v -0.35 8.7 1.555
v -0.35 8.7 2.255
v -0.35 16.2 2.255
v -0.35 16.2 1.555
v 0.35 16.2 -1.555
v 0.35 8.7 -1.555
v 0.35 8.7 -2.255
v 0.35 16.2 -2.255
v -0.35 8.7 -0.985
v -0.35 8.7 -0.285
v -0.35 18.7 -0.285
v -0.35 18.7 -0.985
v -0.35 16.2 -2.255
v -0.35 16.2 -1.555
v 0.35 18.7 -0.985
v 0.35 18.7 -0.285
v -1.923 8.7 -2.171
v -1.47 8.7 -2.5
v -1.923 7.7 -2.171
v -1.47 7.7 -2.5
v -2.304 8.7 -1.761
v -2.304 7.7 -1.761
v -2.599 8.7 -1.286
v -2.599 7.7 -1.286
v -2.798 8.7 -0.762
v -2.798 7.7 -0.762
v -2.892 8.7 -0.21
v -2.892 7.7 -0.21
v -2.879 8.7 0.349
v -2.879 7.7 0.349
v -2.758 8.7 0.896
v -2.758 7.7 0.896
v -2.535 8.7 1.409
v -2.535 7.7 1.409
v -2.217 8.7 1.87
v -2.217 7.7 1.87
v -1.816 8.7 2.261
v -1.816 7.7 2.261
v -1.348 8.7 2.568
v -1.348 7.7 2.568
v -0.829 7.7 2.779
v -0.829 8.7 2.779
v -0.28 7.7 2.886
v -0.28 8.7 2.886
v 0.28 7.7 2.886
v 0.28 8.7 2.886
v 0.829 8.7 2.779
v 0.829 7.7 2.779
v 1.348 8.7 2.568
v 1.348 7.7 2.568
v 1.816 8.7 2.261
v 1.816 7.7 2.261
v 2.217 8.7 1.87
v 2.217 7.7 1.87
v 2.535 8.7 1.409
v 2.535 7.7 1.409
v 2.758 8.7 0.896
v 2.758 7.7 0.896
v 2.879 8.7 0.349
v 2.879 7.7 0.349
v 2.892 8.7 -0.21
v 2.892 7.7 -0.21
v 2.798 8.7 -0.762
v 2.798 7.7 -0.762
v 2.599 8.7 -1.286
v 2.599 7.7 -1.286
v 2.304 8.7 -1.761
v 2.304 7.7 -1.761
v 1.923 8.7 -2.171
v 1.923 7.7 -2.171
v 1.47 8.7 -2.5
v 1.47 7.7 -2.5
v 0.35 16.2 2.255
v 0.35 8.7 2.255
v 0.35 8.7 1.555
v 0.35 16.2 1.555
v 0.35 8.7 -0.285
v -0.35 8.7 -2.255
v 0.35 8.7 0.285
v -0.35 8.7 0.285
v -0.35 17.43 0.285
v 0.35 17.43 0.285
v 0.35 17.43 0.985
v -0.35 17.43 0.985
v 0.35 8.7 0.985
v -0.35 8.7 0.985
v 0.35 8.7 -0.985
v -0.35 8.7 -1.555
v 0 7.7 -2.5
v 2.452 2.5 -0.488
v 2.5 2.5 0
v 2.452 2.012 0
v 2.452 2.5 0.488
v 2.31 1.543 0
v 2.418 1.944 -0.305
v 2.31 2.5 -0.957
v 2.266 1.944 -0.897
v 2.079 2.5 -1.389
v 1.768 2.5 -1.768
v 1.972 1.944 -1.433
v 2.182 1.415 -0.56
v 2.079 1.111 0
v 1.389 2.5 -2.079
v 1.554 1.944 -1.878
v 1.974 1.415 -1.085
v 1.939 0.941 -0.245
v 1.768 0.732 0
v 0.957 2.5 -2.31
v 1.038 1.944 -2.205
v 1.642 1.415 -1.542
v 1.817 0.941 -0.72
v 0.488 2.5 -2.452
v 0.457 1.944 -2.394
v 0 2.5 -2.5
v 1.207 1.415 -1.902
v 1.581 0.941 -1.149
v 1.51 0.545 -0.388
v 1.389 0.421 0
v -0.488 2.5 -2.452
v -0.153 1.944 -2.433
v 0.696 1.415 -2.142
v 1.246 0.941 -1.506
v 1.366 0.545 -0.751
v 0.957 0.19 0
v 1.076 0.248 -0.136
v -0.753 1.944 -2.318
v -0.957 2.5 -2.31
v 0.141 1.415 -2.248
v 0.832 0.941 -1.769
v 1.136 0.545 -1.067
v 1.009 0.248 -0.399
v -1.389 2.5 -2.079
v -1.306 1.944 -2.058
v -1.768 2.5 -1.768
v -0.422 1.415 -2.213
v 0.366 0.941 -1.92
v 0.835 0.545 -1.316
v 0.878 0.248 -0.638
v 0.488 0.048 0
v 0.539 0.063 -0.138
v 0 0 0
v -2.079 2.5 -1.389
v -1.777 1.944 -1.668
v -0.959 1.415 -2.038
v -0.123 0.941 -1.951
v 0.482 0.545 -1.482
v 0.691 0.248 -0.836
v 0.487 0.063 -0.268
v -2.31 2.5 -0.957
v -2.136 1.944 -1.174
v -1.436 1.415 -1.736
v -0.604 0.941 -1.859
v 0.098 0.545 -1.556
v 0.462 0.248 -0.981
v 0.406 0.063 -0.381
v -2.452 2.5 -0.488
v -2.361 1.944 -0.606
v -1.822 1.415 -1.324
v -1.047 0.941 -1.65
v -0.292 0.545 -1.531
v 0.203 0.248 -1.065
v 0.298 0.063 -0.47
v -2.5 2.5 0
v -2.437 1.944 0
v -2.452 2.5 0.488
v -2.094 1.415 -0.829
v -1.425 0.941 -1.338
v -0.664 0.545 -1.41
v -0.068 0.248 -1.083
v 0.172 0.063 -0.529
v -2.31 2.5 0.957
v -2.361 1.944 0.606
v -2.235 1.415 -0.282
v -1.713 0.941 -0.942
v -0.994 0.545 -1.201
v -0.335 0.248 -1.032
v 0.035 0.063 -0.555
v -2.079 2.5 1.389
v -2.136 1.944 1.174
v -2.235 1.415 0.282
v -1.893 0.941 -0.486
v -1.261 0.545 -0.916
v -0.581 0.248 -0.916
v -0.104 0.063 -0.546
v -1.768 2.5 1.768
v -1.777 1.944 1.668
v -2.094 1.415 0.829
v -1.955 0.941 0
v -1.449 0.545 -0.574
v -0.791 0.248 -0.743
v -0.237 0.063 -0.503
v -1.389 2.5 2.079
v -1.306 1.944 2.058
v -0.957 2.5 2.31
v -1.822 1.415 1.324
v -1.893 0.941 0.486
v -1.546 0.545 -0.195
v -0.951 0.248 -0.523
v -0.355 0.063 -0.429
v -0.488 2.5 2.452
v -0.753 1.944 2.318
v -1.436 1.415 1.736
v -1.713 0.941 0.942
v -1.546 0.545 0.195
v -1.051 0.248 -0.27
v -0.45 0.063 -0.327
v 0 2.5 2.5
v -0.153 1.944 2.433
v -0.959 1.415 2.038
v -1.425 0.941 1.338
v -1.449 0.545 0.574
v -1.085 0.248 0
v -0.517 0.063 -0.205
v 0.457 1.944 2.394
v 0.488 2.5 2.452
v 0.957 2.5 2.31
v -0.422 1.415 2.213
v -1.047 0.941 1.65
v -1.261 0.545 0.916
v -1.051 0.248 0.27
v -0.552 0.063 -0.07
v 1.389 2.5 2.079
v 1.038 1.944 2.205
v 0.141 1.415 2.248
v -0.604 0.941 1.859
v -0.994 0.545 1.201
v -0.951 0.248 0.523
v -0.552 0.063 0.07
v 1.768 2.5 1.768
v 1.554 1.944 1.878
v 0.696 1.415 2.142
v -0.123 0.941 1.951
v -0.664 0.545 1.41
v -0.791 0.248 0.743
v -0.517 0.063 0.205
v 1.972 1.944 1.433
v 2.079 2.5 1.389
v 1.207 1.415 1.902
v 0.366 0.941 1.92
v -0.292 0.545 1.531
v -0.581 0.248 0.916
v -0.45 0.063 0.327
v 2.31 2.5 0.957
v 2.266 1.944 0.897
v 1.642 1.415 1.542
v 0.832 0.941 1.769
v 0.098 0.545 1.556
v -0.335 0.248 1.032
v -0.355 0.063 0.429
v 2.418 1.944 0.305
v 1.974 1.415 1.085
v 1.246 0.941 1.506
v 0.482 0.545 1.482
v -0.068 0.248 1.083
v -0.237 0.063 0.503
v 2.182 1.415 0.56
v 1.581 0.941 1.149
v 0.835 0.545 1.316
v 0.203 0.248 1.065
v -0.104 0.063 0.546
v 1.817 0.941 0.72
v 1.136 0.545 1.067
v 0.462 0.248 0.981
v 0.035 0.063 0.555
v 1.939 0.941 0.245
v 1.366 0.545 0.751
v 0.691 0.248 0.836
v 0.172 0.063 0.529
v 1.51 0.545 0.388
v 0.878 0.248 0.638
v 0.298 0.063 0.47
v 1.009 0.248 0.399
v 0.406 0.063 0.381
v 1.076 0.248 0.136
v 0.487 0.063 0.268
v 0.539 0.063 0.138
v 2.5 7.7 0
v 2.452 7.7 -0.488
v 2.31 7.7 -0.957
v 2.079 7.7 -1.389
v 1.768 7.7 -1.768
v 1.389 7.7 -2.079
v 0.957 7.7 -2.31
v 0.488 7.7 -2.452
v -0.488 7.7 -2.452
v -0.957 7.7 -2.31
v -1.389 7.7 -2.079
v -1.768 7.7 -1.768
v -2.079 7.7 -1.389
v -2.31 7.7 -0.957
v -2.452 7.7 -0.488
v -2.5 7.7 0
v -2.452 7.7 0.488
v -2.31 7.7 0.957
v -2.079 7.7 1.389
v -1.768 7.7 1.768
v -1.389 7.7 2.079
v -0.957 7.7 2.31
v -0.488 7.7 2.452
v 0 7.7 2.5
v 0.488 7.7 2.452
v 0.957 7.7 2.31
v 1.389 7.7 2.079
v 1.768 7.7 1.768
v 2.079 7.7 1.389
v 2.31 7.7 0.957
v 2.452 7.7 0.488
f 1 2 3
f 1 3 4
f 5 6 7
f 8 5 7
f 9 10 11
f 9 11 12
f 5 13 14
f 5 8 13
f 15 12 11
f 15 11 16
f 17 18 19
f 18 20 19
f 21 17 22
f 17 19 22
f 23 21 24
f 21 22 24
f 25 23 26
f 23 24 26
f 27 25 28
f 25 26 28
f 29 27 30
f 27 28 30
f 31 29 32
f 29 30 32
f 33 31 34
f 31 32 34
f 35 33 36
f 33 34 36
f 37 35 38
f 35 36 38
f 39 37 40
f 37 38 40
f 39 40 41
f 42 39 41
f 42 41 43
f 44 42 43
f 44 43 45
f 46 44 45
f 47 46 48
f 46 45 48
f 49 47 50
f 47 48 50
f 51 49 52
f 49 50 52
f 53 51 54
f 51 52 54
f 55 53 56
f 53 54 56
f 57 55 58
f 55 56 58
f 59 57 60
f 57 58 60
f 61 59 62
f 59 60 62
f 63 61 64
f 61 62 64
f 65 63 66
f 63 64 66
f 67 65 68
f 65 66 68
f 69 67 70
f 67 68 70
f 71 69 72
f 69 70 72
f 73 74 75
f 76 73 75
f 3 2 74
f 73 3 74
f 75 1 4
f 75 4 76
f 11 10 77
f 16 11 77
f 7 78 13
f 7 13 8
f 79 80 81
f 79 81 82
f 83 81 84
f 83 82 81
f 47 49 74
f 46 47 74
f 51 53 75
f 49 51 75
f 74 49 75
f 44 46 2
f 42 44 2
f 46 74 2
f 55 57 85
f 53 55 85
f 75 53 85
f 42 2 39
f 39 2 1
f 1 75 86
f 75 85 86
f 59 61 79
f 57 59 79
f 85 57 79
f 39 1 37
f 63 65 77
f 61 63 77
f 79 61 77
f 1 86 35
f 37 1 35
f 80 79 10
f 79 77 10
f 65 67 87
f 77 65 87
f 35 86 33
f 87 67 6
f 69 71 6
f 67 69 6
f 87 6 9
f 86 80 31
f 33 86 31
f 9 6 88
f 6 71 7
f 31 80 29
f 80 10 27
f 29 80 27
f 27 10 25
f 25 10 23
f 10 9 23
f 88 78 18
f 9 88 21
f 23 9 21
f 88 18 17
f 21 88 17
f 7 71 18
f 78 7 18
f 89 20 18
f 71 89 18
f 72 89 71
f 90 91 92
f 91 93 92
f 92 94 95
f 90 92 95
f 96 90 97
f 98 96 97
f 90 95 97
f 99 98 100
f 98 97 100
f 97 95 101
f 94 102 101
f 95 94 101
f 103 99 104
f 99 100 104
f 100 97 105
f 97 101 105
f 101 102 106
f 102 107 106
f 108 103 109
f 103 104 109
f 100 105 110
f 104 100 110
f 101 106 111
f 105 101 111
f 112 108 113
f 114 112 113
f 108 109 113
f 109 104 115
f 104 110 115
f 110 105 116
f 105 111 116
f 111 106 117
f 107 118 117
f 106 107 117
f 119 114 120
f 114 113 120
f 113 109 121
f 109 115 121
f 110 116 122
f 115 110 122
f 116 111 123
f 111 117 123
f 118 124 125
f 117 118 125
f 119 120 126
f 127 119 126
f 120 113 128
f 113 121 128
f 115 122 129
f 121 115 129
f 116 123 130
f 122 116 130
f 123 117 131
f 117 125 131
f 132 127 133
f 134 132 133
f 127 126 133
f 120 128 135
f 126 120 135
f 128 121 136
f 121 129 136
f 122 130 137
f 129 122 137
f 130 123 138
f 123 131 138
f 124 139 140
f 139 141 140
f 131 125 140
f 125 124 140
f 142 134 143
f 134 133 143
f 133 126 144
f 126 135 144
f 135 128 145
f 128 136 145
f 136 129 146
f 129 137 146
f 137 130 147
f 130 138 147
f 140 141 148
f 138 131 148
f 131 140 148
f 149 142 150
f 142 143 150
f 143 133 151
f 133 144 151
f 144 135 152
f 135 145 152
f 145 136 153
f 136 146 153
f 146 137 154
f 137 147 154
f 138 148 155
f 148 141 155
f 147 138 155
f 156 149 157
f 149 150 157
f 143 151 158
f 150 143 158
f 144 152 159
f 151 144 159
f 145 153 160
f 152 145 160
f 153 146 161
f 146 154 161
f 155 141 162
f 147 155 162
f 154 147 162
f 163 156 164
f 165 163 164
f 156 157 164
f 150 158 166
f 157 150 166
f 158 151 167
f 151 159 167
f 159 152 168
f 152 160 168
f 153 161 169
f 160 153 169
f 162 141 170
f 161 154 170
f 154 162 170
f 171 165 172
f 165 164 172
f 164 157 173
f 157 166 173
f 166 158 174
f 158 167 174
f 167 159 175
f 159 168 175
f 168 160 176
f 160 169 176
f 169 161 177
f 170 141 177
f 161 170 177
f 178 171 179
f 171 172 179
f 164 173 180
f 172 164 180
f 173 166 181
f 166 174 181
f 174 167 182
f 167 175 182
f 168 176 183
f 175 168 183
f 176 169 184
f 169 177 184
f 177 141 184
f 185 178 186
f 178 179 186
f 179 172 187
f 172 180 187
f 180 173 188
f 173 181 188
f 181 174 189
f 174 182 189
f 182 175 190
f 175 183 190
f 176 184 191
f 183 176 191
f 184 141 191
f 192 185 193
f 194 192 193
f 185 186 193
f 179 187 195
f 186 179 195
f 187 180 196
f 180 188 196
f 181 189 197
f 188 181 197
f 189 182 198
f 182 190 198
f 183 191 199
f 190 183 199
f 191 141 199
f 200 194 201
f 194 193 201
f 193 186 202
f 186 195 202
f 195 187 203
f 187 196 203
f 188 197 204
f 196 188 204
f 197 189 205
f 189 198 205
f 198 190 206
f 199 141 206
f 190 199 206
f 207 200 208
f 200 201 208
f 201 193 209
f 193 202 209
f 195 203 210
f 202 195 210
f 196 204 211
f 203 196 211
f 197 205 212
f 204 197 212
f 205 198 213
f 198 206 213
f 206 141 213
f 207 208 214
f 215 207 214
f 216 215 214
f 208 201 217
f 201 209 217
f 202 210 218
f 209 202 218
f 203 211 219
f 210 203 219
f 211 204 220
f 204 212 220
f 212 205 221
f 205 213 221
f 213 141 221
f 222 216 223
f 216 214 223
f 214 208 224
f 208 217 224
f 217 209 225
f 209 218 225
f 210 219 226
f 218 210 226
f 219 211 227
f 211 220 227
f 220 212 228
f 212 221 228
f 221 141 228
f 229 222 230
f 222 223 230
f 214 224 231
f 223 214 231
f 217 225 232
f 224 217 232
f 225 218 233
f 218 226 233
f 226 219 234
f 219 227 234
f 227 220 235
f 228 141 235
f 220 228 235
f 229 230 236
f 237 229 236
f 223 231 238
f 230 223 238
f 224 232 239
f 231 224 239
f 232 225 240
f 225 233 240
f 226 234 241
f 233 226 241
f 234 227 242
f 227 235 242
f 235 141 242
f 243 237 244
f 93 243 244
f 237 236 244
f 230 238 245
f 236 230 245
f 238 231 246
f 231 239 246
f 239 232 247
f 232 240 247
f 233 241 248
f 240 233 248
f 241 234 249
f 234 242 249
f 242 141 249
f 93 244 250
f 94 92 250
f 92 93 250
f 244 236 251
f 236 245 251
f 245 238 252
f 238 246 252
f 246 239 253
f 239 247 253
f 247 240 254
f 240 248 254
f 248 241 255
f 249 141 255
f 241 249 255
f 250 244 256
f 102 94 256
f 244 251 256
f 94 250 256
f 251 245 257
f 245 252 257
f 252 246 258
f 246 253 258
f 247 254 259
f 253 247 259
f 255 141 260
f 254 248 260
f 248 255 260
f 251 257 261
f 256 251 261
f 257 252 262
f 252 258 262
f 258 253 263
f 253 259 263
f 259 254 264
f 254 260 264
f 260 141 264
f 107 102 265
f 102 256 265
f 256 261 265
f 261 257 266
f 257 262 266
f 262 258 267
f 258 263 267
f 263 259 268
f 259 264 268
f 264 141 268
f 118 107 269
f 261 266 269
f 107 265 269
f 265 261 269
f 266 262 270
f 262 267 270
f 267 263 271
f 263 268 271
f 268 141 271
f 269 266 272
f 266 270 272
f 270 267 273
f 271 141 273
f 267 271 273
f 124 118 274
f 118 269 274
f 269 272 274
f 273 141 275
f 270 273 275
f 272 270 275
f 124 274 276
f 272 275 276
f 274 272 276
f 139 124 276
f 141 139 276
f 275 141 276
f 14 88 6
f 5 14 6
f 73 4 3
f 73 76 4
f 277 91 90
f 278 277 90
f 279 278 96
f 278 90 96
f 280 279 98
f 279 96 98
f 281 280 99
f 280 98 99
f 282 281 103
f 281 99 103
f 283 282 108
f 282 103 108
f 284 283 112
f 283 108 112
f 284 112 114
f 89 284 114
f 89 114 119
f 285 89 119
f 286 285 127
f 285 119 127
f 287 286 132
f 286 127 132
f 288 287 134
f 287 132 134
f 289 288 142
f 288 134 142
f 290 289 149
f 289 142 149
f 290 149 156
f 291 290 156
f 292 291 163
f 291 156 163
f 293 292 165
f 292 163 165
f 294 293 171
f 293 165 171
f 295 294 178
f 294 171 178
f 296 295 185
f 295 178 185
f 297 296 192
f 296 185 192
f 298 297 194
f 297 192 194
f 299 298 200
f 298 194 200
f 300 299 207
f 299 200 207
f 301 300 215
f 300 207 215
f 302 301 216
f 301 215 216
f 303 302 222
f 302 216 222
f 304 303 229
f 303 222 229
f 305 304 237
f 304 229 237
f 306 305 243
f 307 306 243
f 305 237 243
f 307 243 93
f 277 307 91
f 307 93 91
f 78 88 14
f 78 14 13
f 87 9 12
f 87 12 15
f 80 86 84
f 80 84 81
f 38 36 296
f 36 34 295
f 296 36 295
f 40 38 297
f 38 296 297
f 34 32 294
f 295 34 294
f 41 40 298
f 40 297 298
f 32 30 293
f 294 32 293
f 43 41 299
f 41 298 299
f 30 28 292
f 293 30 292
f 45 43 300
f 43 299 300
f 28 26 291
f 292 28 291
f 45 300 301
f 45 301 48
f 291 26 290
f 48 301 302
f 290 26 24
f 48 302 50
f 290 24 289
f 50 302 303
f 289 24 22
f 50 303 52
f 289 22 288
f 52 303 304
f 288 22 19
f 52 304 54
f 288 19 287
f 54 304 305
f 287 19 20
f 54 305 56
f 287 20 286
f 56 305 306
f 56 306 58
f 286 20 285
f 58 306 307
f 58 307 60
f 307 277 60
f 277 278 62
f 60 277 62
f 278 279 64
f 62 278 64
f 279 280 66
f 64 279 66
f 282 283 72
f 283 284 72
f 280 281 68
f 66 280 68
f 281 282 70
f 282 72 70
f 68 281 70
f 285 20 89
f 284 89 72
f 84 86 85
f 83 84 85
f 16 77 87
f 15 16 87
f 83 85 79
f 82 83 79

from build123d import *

# Parameters (mm, degrees)
ENL_V_MAT_EXTRU_1_REACH = 10.724
ESQUISSE3_W             = 0.7
ESQUISSE3_H             = 0.7
BOSS_EXTRU_1_DEPTH      = 10
ENL_V_START             = -3.25
ENL_V_MAT_EXTRU_2_DEPTH = 5.8


with BuildPart() as part:
    # Esquisse1 → Révolution1 (revolve)
    with BuildSketch(Plane.XY):
        with BuildLine():
            Line((2.5, 7.7), (2.5, 2.5))
            ThreePointArc((2.5, 2.5), (1.767766953, 0.732233047), (0, 0))
            Line((0, 0), (0, 8.7))
            Line((0, 8.7), (2.9, 8.7))
            Line((2.9, 8.7), (2.9, 7.7))
            Line((2.9, 7.7), (2.5, 7.7))
        make_face()
    revolve(axis=Axis((0, 0, 0), (0, 1, 0)))

    # Esquisse2 → Enlèv. mat.-Extru.1 (cut, up to next)
    with BuildSketch(Plane(origin=(0, 7.7, 0), x_dir=(-1, 0, 0), z_dir=(0, -1, 0)), mode=Mode.PRIVATE) as enl_v_mat_extru_1_sk1:
        Polygon((2.031643218, 2.5), (-2.119175806, 2.5), (-0.304277426, 5.41579693), align=None)
    enl_v_mat_extru_1_tool1 = extrude(enl_v_mat_extru_1_sk1.sketch, amount=-ENL_V_MAT_EXTRU_1_REACH, mode=Mode.PRIVATE) & part.part
    add(enl_v_mat_extru_1_tool1.solids().sort_by_distance((0.130603, 7.7, -3.471932))[0], mode=Mode.SUBTRACT)

    # Esquisse3 → Boss.-Extru.1 (add)
    with BuildSketch(Plane(origin=(0, 8.7, 0), x_dir=(1, 0, 0), z_dir=(0, 1, 0))):
        with Locations((0, 1.905)):
            Rectangle(ESQUISSE3_W, ESQUISSE3_H)
        with Locations((0, -0.635)):
            Rectangle(ESQUISSE3_W, ESQUISSE3_H)
        with Locations((0, -1.905)):
            Rectangle(ESQUISSE3_W, ESQUISSE3_H)
        with Locations((0, 0.635)):
            Rectangle(ESQUISSE3_W, ESQUISSE3_H)
    extrude(amount=BOSS_EXTRU_1_DEPTH)

    # Esquisse4 → Enlèv. mat.-Extru.2 (cut)
    with BuildSketch(Plane.ZY.offset(0.35).offset(ENL_V_START)):
        Polygon((-2.885095567, 16.2), (-1.265657514, 16.2), (-1.265657514, 33.921907916), (0, 33.921907916), (0, 17.43), (1.344412991, 17.43), (1.344412991, 16.2), (2.897512796, 16.2), (2.897512796, 34.676886987), (-2.885095567, 34.676886987), align=None)
    extrude(amount=ENL_V_MAT_EXTRU_2_DEPTH, mode=Mode.SUBTRACT)


solid = part.part
